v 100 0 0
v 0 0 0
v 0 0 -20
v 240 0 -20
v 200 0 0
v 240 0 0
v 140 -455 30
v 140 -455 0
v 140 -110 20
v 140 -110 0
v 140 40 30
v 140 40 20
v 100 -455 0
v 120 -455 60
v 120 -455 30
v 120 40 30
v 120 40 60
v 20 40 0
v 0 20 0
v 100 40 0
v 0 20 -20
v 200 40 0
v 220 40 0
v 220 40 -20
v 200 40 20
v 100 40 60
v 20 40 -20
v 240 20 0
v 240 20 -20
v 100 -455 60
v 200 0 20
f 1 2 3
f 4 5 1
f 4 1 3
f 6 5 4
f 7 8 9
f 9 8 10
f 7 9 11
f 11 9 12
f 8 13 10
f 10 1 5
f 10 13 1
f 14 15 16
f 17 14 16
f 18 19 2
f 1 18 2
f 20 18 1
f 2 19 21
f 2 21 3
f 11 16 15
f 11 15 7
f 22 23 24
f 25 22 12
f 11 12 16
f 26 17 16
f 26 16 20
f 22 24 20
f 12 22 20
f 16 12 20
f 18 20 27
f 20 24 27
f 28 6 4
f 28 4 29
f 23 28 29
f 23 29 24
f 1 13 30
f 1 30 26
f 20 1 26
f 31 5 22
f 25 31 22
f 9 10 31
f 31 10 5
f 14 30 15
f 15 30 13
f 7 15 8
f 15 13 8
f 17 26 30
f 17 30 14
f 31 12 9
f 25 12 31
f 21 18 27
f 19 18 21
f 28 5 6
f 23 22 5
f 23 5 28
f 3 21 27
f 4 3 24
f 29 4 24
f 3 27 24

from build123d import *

# Parameters (mm, degrees)
F1_DEPTH = 20
F2_W     = 20
F2_H     = 495
F3_DEPTH = 60
F4_DEPTH = 30
F5_DEPTH = 20


with BuildPart() as f1:
    # F0 (on Top) → F1 (new body)
    with BuildSketch(Plane.XY):
        Polygon((120, 40), (20, 40), (0, 20), (0, 0), (120, 0), align=None)
        Polygon((220, 40), (120, 40), (120, 0), (240, 0), (240, 20), align=None)
    extrude(amount=-F1_DEPTH)

    # F2 (on Top) → F3 (join)
    with BuildSketch(Plane.XY):
        with Locations((110, -207.5)):
            Rectangle(F2_W, F2_H)
    extrude(amount=F3_DEPTH)

    # F2 (on Top) → F4 (join)
    with BuildSketch(Plane.XY):
        Polygon((140, 40), (120, 40), (120, -455), (140, -455), (140, -110), align=None)
    extrude(amount=F4_DEPTH)

    # F2 (on Top) → F5 (join)
    with BuildSketch(Plane.XY):
        Polygon((200, 40), (140, 40), (140, -110), (200, 0), align=None)
    extrude(amount=F5_DEPTH)


solid = f1.part
